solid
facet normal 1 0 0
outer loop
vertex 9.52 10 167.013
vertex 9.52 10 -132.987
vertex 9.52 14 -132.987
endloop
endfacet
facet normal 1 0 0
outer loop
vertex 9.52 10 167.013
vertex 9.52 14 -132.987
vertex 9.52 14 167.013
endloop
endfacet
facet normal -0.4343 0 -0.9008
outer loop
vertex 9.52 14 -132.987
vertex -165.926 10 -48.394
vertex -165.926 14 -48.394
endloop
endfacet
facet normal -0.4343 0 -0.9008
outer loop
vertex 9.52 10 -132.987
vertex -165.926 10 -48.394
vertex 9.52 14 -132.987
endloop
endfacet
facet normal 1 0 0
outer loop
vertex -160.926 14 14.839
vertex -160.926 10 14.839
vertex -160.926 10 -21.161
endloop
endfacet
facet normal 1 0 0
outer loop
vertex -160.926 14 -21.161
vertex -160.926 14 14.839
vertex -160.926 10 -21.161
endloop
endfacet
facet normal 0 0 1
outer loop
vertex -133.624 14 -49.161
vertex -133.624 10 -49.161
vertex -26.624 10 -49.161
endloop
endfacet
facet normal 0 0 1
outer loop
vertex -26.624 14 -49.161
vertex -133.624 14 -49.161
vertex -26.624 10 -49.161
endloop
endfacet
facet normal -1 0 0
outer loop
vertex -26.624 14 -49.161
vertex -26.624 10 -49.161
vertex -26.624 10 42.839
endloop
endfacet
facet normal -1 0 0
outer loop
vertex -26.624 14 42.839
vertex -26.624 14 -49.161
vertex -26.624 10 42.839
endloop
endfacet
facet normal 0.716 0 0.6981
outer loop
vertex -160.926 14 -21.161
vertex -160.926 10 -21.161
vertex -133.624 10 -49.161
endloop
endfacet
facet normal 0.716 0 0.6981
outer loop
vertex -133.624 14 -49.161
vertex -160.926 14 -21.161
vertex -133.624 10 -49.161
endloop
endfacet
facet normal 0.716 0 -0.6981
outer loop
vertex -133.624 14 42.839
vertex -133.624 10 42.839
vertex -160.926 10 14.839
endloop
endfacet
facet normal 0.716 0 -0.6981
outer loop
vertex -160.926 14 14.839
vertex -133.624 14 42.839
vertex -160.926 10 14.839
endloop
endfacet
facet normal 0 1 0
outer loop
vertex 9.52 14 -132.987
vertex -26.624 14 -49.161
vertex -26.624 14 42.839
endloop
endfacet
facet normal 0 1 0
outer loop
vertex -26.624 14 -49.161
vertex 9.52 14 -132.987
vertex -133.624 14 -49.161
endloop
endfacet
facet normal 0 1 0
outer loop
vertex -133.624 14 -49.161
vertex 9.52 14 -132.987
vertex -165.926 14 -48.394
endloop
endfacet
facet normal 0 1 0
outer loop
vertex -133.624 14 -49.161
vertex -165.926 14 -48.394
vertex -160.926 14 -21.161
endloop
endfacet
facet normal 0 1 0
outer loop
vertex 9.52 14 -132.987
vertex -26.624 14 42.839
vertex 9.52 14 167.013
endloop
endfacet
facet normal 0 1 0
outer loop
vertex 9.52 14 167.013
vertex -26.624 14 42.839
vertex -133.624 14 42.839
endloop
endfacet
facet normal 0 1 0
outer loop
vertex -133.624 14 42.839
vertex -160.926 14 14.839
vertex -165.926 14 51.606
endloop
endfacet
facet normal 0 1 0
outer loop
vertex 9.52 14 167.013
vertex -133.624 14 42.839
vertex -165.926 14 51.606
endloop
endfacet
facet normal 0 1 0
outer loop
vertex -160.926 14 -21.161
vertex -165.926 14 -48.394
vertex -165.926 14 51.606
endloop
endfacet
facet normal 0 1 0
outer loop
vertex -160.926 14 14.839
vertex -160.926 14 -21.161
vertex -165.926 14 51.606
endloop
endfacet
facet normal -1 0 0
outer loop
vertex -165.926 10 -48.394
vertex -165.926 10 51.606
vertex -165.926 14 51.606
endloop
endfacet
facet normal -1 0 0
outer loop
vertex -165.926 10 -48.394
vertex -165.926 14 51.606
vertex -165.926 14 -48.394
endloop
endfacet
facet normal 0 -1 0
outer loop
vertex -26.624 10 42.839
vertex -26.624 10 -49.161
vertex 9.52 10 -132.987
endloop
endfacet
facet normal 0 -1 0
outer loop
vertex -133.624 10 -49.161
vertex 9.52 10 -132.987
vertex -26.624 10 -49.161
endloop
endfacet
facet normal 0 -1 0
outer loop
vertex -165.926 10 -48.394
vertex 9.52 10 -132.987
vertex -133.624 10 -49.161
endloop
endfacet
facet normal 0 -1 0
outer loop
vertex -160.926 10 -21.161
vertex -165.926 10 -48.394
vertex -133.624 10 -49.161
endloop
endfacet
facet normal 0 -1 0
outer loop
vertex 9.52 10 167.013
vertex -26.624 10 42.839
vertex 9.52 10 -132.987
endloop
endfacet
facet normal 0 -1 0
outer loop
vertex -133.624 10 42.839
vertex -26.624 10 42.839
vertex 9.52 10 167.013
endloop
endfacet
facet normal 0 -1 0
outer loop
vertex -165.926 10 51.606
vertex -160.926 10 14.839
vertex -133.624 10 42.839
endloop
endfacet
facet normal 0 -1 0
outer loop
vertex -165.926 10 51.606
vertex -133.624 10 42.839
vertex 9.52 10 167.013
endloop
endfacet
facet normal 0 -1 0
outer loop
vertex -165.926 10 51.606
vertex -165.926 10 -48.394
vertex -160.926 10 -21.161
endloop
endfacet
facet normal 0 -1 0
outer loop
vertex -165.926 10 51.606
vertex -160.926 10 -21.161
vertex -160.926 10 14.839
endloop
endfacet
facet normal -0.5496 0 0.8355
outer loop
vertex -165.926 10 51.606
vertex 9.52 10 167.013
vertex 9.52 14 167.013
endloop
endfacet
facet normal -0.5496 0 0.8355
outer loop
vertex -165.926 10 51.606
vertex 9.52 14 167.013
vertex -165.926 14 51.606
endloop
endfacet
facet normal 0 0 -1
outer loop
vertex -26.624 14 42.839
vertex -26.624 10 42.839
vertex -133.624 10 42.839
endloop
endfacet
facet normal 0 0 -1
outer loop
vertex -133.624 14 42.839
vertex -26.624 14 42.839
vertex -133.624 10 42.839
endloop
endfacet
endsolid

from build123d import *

# Parameters (mm, degrees)
EXTRUDE_2_DEPTH = 4


with BuildPart() as part:
    # Sketch 1 → Бобышка-Вытянуть2 (new body)
    with BuildSketch(Plane(origin=(9.520291442, 10, -132.987365348), x_dir=(0, 0, 1), z_dir=(0, -1, 0))):
        Polygon((0, 0), (300, 0), (184.59311112, 175.445860593), (84.59311112, 175.445860593), align=None)
        Polygon((83.826194839, 143.144403483), (83.826194839, 36.144403483), (175.826194839, 36.144403483), (175.826194839, 143.144403483), (147.826194839, 170.445860593), (111.826194839, 170.445860593), align=None, mode=Mode.SUBTRACT)
    extrude(amount=-EXTRUDE_2_DEPTH)


solid = part.part
